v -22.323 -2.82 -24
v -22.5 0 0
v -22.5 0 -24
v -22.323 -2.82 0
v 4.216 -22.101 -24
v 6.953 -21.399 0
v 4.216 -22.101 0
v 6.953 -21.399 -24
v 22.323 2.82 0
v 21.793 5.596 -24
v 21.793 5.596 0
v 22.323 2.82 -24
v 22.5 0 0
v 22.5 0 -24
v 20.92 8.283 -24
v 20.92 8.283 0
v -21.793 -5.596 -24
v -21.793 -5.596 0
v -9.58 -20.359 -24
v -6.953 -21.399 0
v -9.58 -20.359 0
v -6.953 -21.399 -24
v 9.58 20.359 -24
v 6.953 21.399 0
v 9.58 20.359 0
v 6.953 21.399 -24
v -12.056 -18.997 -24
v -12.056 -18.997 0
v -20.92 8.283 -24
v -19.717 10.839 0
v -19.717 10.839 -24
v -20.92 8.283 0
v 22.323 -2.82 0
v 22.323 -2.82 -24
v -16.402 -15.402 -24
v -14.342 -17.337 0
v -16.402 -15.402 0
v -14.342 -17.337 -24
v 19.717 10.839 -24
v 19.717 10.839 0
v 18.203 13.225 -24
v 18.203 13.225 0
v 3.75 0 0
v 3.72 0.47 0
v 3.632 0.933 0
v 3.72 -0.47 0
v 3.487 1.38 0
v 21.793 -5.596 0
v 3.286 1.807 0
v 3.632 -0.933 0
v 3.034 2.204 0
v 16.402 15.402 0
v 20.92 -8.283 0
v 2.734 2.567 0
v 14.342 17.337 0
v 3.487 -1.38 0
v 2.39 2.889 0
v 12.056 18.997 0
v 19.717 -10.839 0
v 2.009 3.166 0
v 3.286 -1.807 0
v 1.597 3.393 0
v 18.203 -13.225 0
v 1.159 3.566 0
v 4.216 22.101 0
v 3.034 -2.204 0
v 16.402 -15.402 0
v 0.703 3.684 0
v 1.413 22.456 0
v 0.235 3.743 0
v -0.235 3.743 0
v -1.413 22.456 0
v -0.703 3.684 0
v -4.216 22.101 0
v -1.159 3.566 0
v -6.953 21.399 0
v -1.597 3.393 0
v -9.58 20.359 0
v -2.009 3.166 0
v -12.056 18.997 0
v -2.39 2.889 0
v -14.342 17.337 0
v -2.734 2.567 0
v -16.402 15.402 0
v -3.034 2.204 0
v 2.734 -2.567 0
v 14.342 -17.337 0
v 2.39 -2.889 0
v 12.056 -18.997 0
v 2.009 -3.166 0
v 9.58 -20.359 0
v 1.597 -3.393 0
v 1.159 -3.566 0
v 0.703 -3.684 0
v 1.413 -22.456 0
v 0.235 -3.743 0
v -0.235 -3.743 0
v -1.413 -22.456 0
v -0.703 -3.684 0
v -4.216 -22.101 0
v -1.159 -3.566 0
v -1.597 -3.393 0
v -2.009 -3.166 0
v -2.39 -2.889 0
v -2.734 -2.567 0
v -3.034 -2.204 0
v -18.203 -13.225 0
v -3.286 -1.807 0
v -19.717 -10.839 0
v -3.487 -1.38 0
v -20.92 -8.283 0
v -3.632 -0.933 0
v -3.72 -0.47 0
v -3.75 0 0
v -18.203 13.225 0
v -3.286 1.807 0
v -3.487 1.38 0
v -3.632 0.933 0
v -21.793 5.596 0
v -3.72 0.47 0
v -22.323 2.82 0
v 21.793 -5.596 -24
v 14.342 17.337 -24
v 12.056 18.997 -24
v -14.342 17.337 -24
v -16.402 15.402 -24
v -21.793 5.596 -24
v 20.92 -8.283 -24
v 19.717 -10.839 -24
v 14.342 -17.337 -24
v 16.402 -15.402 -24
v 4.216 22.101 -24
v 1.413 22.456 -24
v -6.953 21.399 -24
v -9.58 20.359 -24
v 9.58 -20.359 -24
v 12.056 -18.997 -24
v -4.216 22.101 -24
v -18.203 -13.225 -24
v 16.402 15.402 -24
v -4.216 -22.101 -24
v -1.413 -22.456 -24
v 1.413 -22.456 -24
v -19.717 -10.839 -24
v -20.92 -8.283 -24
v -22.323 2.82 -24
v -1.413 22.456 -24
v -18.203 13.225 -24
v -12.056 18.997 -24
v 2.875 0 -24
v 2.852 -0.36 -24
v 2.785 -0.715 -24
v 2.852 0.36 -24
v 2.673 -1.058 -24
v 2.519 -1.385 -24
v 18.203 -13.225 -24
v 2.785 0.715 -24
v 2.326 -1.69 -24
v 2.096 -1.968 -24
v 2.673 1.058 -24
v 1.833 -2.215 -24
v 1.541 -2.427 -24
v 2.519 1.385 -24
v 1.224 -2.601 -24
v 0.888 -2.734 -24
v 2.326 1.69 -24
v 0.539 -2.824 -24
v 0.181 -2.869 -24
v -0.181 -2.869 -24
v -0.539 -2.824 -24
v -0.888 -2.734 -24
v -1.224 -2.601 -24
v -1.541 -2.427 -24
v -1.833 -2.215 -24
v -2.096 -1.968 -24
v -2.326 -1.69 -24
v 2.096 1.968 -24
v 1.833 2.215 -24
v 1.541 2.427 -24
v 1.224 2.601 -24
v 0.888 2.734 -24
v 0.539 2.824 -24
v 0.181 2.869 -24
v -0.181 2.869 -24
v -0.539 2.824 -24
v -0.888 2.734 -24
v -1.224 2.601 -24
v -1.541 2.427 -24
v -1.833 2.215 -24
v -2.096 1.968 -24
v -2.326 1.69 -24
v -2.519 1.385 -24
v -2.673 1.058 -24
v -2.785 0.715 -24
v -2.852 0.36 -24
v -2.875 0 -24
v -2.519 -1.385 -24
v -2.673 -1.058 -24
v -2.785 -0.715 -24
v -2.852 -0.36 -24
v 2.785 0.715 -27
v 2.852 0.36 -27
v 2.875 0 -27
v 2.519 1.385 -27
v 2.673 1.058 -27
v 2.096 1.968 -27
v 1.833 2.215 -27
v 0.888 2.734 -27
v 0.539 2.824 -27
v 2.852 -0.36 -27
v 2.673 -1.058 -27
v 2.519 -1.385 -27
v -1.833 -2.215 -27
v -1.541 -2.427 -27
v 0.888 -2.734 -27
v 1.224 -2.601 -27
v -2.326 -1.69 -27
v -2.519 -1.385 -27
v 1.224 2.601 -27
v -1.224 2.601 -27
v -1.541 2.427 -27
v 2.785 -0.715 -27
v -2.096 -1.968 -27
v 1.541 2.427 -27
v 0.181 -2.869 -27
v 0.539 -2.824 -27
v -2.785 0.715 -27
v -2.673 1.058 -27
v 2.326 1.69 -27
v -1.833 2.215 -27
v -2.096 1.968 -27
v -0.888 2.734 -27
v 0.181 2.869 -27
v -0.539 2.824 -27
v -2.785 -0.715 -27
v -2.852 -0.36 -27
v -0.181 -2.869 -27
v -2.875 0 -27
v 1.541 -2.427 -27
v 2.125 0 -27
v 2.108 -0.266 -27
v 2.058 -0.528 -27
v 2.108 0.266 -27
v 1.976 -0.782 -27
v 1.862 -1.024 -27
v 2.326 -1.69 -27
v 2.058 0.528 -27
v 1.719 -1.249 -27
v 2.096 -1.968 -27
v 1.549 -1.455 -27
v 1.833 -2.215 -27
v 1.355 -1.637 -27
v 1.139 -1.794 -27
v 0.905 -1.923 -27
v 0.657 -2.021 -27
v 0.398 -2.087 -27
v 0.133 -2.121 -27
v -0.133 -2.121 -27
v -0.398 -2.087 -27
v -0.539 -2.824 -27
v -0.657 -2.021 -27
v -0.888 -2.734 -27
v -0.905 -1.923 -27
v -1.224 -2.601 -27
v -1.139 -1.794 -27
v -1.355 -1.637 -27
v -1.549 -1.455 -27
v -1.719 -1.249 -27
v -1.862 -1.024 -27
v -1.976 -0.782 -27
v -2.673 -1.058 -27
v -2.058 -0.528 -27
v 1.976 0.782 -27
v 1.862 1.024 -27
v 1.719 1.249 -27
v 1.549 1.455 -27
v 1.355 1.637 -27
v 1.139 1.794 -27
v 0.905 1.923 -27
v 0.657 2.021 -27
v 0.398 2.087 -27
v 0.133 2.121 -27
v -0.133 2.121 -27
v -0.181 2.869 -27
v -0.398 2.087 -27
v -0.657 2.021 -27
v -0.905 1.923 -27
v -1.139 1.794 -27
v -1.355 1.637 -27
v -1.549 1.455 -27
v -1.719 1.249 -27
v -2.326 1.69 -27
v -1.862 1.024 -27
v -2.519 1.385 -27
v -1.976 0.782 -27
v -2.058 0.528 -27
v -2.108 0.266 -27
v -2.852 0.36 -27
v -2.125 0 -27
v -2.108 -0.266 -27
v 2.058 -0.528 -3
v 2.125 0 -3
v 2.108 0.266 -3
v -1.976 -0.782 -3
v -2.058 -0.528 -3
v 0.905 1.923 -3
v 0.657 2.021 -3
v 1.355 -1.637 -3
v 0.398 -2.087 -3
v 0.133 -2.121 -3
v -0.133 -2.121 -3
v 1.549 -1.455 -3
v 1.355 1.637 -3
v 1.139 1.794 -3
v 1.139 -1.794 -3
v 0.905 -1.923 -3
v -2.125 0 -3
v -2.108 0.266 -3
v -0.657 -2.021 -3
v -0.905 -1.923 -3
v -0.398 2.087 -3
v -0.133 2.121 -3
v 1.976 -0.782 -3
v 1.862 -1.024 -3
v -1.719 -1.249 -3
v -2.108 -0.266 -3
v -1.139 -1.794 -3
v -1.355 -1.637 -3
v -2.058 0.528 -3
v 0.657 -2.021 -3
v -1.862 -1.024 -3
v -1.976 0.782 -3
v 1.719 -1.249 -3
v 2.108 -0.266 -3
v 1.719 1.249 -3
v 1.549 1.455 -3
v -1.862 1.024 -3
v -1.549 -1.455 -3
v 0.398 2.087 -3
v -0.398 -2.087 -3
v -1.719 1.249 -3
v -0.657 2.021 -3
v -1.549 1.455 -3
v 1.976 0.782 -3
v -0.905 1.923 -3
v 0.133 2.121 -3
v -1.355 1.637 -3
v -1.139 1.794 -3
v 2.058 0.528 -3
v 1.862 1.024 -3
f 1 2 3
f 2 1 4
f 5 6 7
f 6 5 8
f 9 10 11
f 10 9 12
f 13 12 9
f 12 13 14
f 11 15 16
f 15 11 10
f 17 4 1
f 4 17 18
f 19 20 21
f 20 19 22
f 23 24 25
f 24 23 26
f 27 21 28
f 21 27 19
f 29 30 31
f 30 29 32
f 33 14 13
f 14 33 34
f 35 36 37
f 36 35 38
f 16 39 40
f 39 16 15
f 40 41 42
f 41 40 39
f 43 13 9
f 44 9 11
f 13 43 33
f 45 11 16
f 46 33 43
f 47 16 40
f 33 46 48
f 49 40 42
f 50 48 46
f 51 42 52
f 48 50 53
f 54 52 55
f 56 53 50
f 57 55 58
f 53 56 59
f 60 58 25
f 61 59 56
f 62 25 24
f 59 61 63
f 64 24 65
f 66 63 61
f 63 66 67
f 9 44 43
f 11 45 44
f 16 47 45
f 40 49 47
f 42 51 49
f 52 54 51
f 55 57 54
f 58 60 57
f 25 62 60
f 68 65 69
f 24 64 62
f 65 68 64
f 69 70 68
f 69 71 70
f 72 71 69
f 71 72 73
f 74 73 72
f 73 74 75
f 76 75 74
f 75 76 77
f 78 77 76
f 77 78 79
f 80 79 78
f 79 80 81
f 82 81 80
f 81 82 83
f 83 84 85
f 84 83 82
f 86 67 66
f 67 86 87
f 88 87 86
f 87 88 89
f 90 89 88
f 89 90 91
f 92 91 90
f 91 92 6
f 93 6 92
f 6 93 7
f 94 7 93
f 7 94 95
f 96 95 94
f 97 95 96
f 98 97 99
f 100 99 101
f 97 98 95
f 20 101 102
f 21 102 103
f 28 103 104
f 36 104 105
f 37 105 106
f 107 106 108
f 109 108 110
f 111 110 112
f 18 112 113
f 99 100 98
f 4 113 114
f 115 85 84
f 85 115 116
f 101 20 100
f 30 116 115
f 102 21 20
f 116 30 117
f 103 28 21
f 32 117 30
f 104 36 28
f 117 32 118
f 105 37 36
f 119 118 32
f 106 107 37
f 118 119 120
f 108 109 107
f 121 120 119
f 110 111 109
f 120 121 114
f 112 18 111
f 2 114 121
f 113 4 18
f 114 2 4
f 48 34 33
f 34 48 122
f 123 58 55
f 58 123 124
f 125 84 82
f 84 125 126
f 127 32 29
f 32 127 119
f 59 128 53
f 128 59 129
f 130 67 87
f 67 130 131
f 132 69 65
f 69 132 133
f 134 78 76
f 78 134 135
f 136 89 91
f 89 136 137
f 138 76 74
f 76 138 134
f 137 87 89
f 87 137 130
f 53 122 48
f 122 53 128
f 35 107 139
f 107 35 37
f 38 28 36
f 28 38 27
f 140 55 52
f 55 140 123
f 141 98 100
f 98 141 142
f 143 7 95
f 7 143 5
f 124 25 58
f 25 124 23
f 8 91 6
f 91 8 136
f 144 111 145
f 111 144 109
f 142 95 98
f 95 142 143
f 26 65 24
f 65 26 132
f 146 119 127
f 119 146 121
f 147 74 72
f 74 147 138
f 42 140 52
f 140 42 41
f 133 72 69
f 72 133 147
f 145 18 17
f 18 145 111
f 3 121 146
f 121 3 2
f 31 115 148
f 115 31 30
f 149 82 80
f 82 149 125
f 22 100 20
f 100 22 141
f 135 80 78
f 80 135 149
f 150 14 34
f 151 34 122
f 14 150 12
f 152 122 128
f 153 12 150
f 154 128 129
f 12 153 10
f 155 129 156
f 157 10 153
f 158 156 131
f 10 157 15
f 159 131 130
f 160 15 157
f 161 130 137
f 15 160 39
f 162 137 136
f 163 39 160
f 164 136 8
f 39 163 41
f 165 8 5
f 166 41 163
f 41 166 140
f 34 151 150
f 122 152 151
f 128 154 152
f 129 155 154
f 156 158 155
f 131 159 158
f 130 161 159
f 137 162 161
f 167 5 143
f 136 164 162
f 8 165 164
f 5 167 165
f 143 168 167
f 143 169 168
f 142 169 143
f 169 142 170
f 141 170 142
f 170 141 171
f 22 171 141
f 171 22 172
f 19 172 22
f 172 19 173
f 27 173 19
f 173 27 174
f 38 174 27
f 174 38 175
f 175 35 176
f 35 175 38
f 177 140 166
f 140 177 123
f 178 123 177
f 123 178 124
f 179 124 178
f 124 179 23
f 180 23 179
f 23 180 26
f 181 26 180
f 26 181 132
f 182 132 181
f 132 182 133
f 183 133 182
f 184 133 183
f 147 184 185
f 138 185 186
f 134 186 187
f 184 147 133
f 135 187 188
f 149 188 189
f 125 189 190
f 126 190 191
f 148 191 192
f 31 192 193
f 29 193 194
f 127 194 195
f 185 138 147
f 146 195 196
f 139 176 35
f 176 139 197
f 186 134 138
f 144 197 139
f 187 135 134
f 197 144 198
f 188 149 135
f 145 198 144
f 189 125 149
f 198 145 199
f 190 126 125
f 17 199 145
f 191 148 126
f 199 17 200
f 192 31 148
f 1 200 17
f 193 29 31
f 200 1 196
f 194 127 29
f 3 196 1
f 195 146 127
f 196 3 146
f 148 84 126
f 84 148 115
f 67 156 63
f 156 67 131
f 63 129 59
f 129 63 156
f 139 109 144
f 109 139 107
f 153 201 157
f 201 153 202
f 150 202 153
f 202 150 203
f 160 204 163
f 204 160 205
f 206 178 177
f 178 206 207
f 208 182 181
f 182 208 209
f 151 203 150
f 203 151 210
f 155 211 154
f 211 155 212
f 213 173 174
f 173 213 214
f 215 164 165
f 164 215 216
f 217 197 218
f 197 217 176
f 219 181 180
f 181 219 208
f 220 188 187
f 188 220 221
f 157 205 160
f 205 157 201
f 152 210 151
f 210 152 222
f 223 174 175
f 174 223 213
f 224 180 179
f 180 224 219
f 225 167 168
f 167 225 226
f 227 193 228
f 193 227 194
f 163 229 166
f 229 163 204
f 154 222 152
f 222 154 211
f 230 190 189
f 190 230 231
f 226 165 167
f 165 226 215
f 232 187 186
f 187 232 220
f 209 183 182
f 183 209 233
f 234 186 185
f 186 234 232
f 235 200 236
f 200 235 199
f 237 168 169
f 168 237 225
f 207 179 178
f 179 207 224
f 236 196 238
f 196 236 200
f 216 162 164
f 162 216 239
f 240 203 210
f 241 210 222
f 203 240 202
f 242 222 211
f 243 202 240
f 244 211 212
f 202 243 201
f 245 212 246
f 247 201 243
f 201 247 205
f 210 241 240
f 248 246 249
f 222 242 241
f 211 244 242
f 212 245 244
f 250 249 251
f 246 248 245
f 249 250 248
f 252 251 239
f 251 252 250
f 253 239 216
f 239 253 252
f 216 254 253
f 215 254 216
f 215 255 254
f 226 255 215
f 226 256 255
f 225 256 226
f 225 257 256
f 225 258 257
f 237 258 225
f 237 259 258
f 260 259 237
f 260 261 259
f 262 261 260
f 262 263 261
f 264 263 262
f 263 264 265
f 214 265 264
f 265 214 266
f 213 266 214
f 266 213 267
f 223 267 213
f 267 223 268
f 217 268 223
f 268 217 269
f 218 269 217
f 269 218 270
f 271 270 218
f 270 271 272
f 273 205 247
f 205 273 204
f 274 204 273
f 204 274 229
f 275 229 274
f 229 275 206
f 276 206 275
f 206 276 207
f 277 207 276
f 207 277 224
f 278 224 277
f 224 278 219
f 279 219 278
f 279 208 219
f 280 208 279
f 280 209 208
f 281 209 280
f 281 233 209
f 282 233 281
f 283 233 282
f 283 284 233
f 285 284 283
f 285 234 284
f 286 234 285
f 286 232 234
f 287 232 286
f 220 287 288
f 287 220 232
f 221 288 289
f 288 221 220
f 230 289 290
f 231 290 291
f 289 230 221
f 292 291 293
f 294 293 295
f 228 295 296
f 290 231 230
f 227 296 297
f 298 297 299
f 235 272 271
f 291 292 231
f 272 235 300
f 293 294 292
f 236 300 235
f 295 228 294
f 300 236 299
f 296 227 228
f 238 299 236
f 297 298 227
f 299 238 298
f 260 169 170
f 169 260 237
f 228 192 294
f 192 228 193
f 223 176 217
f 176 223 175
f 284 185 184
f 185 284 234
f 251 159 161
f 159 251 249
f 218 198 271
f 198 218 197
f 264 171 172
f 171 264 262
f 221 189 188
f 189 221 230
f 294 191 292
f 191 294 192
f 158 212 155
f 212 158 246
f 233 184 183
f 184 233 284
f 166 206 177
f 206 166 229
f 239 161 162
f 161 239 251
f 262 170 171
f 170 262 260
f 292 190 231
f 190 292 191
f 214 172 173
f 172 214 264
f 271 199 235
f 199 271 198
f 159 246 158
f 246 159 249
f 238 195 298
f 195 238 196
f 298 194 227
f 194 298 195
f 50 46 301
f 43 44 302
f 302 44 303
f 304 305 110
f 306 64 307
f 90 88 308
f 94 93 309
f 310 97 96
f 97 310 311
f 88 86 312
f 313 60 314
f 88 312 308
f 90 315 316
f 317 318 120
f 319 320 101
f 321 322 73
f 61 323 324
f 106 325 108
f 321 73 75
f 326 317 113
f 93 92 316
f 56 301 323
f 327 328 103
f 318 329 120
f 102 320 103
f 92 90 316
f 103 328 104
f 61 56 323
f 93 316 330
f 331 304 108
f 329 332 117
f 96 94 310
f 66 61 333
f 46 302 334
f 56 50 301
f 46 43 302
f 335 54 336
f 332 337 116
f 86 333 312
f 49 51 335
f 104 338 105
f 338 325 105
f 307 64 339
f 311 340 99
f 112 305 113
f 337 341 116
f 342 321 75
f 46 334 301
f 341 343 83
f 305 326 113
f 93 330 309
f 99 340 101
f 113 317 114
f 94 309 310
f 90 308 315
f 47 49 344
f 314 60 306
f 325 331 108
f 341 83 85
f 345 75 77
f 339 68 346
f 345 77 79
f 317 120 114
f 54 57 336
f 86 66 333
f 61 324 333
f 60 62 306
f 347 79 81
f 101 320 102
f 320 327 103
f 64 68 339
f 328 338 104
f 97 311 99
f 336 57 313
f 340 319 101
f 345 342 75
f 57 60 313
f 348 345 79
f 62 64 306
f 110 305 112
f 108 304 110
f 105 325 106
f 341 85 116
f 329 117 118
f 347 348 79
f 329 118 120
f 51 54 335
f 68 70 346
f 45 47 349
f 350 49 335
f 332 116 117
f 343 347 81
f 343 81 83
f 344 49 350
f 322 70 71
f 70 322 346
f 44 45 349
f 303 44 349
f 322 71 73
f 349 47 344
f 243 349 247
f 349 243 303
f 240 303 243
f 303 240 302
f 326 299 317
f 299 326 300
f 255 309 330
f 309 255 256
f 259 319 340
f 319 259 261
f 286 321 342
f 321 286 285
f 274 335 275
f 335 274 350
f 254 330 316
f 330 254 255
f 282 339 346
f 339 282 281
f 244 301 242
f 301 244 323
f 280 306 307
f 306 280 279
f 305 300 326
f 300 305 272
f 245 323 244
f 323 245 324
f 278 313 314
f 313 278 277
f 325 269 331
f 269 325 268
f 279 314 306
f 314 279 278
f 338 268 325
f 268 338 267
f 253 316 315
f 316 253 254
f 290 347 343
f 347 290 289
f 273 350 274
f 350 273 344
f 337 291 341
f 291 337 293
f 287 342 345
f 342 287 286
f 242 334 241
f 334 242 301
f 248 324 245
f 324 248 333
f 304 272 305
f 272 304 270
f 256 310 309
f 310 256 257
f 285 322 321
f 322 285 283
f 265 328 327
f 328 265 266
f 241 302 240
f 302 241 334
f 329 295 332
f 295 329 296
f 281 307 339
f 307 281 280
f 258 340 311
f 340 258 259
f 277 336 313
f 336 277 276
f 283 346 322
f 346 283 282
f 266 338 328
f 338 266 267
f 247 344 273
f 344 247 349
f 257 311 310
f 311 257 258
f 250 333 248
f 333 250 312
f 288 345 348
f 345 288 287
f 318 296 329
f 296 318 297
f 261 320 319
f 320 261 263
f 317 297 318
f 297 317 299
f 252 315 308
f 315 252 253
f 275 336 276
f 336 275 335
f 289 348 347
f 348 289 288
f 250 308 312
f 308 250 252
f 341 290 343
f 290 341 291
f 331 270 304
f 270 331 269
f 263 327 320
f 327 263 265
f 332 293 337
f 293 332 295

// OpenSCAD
$fn = 50;


difference() {
	union() {
		translate(v = [0, 0, -24.0000000000]) {
			cylinder(h = 24, r = 22.5000000000);
		}
		#translate(v = [0, 0, -27.0000000000]) {
			cylinder(h = 27, r = 2.8750000000);
		}
	}
	union() {
		translate(v = [0, 0, 0]) {
			rotate(a = [0, 0, 0]) {
				difference() {
					union() {
						translate(v = [0, 0, -27.0000000000]) {
							cylinder(h = 27, r = 2.0000000000);
						}
						translate(v = [0, 0, -3]) {
							cylinder(h = 3, r1 = 2.1250000000, r2 = 3.7500000000);
						}
						translate(v = [0, 0, -27.0000000000]) {
							cylinder(h = 27, r = 2.1250000000);
						}
						translate(v = [0, 0, -27.0000000000]) {
							cylinder(h = 27, r = 2.0000000000);
						}
					}
					union();
				}
			}
		}
	}
}
